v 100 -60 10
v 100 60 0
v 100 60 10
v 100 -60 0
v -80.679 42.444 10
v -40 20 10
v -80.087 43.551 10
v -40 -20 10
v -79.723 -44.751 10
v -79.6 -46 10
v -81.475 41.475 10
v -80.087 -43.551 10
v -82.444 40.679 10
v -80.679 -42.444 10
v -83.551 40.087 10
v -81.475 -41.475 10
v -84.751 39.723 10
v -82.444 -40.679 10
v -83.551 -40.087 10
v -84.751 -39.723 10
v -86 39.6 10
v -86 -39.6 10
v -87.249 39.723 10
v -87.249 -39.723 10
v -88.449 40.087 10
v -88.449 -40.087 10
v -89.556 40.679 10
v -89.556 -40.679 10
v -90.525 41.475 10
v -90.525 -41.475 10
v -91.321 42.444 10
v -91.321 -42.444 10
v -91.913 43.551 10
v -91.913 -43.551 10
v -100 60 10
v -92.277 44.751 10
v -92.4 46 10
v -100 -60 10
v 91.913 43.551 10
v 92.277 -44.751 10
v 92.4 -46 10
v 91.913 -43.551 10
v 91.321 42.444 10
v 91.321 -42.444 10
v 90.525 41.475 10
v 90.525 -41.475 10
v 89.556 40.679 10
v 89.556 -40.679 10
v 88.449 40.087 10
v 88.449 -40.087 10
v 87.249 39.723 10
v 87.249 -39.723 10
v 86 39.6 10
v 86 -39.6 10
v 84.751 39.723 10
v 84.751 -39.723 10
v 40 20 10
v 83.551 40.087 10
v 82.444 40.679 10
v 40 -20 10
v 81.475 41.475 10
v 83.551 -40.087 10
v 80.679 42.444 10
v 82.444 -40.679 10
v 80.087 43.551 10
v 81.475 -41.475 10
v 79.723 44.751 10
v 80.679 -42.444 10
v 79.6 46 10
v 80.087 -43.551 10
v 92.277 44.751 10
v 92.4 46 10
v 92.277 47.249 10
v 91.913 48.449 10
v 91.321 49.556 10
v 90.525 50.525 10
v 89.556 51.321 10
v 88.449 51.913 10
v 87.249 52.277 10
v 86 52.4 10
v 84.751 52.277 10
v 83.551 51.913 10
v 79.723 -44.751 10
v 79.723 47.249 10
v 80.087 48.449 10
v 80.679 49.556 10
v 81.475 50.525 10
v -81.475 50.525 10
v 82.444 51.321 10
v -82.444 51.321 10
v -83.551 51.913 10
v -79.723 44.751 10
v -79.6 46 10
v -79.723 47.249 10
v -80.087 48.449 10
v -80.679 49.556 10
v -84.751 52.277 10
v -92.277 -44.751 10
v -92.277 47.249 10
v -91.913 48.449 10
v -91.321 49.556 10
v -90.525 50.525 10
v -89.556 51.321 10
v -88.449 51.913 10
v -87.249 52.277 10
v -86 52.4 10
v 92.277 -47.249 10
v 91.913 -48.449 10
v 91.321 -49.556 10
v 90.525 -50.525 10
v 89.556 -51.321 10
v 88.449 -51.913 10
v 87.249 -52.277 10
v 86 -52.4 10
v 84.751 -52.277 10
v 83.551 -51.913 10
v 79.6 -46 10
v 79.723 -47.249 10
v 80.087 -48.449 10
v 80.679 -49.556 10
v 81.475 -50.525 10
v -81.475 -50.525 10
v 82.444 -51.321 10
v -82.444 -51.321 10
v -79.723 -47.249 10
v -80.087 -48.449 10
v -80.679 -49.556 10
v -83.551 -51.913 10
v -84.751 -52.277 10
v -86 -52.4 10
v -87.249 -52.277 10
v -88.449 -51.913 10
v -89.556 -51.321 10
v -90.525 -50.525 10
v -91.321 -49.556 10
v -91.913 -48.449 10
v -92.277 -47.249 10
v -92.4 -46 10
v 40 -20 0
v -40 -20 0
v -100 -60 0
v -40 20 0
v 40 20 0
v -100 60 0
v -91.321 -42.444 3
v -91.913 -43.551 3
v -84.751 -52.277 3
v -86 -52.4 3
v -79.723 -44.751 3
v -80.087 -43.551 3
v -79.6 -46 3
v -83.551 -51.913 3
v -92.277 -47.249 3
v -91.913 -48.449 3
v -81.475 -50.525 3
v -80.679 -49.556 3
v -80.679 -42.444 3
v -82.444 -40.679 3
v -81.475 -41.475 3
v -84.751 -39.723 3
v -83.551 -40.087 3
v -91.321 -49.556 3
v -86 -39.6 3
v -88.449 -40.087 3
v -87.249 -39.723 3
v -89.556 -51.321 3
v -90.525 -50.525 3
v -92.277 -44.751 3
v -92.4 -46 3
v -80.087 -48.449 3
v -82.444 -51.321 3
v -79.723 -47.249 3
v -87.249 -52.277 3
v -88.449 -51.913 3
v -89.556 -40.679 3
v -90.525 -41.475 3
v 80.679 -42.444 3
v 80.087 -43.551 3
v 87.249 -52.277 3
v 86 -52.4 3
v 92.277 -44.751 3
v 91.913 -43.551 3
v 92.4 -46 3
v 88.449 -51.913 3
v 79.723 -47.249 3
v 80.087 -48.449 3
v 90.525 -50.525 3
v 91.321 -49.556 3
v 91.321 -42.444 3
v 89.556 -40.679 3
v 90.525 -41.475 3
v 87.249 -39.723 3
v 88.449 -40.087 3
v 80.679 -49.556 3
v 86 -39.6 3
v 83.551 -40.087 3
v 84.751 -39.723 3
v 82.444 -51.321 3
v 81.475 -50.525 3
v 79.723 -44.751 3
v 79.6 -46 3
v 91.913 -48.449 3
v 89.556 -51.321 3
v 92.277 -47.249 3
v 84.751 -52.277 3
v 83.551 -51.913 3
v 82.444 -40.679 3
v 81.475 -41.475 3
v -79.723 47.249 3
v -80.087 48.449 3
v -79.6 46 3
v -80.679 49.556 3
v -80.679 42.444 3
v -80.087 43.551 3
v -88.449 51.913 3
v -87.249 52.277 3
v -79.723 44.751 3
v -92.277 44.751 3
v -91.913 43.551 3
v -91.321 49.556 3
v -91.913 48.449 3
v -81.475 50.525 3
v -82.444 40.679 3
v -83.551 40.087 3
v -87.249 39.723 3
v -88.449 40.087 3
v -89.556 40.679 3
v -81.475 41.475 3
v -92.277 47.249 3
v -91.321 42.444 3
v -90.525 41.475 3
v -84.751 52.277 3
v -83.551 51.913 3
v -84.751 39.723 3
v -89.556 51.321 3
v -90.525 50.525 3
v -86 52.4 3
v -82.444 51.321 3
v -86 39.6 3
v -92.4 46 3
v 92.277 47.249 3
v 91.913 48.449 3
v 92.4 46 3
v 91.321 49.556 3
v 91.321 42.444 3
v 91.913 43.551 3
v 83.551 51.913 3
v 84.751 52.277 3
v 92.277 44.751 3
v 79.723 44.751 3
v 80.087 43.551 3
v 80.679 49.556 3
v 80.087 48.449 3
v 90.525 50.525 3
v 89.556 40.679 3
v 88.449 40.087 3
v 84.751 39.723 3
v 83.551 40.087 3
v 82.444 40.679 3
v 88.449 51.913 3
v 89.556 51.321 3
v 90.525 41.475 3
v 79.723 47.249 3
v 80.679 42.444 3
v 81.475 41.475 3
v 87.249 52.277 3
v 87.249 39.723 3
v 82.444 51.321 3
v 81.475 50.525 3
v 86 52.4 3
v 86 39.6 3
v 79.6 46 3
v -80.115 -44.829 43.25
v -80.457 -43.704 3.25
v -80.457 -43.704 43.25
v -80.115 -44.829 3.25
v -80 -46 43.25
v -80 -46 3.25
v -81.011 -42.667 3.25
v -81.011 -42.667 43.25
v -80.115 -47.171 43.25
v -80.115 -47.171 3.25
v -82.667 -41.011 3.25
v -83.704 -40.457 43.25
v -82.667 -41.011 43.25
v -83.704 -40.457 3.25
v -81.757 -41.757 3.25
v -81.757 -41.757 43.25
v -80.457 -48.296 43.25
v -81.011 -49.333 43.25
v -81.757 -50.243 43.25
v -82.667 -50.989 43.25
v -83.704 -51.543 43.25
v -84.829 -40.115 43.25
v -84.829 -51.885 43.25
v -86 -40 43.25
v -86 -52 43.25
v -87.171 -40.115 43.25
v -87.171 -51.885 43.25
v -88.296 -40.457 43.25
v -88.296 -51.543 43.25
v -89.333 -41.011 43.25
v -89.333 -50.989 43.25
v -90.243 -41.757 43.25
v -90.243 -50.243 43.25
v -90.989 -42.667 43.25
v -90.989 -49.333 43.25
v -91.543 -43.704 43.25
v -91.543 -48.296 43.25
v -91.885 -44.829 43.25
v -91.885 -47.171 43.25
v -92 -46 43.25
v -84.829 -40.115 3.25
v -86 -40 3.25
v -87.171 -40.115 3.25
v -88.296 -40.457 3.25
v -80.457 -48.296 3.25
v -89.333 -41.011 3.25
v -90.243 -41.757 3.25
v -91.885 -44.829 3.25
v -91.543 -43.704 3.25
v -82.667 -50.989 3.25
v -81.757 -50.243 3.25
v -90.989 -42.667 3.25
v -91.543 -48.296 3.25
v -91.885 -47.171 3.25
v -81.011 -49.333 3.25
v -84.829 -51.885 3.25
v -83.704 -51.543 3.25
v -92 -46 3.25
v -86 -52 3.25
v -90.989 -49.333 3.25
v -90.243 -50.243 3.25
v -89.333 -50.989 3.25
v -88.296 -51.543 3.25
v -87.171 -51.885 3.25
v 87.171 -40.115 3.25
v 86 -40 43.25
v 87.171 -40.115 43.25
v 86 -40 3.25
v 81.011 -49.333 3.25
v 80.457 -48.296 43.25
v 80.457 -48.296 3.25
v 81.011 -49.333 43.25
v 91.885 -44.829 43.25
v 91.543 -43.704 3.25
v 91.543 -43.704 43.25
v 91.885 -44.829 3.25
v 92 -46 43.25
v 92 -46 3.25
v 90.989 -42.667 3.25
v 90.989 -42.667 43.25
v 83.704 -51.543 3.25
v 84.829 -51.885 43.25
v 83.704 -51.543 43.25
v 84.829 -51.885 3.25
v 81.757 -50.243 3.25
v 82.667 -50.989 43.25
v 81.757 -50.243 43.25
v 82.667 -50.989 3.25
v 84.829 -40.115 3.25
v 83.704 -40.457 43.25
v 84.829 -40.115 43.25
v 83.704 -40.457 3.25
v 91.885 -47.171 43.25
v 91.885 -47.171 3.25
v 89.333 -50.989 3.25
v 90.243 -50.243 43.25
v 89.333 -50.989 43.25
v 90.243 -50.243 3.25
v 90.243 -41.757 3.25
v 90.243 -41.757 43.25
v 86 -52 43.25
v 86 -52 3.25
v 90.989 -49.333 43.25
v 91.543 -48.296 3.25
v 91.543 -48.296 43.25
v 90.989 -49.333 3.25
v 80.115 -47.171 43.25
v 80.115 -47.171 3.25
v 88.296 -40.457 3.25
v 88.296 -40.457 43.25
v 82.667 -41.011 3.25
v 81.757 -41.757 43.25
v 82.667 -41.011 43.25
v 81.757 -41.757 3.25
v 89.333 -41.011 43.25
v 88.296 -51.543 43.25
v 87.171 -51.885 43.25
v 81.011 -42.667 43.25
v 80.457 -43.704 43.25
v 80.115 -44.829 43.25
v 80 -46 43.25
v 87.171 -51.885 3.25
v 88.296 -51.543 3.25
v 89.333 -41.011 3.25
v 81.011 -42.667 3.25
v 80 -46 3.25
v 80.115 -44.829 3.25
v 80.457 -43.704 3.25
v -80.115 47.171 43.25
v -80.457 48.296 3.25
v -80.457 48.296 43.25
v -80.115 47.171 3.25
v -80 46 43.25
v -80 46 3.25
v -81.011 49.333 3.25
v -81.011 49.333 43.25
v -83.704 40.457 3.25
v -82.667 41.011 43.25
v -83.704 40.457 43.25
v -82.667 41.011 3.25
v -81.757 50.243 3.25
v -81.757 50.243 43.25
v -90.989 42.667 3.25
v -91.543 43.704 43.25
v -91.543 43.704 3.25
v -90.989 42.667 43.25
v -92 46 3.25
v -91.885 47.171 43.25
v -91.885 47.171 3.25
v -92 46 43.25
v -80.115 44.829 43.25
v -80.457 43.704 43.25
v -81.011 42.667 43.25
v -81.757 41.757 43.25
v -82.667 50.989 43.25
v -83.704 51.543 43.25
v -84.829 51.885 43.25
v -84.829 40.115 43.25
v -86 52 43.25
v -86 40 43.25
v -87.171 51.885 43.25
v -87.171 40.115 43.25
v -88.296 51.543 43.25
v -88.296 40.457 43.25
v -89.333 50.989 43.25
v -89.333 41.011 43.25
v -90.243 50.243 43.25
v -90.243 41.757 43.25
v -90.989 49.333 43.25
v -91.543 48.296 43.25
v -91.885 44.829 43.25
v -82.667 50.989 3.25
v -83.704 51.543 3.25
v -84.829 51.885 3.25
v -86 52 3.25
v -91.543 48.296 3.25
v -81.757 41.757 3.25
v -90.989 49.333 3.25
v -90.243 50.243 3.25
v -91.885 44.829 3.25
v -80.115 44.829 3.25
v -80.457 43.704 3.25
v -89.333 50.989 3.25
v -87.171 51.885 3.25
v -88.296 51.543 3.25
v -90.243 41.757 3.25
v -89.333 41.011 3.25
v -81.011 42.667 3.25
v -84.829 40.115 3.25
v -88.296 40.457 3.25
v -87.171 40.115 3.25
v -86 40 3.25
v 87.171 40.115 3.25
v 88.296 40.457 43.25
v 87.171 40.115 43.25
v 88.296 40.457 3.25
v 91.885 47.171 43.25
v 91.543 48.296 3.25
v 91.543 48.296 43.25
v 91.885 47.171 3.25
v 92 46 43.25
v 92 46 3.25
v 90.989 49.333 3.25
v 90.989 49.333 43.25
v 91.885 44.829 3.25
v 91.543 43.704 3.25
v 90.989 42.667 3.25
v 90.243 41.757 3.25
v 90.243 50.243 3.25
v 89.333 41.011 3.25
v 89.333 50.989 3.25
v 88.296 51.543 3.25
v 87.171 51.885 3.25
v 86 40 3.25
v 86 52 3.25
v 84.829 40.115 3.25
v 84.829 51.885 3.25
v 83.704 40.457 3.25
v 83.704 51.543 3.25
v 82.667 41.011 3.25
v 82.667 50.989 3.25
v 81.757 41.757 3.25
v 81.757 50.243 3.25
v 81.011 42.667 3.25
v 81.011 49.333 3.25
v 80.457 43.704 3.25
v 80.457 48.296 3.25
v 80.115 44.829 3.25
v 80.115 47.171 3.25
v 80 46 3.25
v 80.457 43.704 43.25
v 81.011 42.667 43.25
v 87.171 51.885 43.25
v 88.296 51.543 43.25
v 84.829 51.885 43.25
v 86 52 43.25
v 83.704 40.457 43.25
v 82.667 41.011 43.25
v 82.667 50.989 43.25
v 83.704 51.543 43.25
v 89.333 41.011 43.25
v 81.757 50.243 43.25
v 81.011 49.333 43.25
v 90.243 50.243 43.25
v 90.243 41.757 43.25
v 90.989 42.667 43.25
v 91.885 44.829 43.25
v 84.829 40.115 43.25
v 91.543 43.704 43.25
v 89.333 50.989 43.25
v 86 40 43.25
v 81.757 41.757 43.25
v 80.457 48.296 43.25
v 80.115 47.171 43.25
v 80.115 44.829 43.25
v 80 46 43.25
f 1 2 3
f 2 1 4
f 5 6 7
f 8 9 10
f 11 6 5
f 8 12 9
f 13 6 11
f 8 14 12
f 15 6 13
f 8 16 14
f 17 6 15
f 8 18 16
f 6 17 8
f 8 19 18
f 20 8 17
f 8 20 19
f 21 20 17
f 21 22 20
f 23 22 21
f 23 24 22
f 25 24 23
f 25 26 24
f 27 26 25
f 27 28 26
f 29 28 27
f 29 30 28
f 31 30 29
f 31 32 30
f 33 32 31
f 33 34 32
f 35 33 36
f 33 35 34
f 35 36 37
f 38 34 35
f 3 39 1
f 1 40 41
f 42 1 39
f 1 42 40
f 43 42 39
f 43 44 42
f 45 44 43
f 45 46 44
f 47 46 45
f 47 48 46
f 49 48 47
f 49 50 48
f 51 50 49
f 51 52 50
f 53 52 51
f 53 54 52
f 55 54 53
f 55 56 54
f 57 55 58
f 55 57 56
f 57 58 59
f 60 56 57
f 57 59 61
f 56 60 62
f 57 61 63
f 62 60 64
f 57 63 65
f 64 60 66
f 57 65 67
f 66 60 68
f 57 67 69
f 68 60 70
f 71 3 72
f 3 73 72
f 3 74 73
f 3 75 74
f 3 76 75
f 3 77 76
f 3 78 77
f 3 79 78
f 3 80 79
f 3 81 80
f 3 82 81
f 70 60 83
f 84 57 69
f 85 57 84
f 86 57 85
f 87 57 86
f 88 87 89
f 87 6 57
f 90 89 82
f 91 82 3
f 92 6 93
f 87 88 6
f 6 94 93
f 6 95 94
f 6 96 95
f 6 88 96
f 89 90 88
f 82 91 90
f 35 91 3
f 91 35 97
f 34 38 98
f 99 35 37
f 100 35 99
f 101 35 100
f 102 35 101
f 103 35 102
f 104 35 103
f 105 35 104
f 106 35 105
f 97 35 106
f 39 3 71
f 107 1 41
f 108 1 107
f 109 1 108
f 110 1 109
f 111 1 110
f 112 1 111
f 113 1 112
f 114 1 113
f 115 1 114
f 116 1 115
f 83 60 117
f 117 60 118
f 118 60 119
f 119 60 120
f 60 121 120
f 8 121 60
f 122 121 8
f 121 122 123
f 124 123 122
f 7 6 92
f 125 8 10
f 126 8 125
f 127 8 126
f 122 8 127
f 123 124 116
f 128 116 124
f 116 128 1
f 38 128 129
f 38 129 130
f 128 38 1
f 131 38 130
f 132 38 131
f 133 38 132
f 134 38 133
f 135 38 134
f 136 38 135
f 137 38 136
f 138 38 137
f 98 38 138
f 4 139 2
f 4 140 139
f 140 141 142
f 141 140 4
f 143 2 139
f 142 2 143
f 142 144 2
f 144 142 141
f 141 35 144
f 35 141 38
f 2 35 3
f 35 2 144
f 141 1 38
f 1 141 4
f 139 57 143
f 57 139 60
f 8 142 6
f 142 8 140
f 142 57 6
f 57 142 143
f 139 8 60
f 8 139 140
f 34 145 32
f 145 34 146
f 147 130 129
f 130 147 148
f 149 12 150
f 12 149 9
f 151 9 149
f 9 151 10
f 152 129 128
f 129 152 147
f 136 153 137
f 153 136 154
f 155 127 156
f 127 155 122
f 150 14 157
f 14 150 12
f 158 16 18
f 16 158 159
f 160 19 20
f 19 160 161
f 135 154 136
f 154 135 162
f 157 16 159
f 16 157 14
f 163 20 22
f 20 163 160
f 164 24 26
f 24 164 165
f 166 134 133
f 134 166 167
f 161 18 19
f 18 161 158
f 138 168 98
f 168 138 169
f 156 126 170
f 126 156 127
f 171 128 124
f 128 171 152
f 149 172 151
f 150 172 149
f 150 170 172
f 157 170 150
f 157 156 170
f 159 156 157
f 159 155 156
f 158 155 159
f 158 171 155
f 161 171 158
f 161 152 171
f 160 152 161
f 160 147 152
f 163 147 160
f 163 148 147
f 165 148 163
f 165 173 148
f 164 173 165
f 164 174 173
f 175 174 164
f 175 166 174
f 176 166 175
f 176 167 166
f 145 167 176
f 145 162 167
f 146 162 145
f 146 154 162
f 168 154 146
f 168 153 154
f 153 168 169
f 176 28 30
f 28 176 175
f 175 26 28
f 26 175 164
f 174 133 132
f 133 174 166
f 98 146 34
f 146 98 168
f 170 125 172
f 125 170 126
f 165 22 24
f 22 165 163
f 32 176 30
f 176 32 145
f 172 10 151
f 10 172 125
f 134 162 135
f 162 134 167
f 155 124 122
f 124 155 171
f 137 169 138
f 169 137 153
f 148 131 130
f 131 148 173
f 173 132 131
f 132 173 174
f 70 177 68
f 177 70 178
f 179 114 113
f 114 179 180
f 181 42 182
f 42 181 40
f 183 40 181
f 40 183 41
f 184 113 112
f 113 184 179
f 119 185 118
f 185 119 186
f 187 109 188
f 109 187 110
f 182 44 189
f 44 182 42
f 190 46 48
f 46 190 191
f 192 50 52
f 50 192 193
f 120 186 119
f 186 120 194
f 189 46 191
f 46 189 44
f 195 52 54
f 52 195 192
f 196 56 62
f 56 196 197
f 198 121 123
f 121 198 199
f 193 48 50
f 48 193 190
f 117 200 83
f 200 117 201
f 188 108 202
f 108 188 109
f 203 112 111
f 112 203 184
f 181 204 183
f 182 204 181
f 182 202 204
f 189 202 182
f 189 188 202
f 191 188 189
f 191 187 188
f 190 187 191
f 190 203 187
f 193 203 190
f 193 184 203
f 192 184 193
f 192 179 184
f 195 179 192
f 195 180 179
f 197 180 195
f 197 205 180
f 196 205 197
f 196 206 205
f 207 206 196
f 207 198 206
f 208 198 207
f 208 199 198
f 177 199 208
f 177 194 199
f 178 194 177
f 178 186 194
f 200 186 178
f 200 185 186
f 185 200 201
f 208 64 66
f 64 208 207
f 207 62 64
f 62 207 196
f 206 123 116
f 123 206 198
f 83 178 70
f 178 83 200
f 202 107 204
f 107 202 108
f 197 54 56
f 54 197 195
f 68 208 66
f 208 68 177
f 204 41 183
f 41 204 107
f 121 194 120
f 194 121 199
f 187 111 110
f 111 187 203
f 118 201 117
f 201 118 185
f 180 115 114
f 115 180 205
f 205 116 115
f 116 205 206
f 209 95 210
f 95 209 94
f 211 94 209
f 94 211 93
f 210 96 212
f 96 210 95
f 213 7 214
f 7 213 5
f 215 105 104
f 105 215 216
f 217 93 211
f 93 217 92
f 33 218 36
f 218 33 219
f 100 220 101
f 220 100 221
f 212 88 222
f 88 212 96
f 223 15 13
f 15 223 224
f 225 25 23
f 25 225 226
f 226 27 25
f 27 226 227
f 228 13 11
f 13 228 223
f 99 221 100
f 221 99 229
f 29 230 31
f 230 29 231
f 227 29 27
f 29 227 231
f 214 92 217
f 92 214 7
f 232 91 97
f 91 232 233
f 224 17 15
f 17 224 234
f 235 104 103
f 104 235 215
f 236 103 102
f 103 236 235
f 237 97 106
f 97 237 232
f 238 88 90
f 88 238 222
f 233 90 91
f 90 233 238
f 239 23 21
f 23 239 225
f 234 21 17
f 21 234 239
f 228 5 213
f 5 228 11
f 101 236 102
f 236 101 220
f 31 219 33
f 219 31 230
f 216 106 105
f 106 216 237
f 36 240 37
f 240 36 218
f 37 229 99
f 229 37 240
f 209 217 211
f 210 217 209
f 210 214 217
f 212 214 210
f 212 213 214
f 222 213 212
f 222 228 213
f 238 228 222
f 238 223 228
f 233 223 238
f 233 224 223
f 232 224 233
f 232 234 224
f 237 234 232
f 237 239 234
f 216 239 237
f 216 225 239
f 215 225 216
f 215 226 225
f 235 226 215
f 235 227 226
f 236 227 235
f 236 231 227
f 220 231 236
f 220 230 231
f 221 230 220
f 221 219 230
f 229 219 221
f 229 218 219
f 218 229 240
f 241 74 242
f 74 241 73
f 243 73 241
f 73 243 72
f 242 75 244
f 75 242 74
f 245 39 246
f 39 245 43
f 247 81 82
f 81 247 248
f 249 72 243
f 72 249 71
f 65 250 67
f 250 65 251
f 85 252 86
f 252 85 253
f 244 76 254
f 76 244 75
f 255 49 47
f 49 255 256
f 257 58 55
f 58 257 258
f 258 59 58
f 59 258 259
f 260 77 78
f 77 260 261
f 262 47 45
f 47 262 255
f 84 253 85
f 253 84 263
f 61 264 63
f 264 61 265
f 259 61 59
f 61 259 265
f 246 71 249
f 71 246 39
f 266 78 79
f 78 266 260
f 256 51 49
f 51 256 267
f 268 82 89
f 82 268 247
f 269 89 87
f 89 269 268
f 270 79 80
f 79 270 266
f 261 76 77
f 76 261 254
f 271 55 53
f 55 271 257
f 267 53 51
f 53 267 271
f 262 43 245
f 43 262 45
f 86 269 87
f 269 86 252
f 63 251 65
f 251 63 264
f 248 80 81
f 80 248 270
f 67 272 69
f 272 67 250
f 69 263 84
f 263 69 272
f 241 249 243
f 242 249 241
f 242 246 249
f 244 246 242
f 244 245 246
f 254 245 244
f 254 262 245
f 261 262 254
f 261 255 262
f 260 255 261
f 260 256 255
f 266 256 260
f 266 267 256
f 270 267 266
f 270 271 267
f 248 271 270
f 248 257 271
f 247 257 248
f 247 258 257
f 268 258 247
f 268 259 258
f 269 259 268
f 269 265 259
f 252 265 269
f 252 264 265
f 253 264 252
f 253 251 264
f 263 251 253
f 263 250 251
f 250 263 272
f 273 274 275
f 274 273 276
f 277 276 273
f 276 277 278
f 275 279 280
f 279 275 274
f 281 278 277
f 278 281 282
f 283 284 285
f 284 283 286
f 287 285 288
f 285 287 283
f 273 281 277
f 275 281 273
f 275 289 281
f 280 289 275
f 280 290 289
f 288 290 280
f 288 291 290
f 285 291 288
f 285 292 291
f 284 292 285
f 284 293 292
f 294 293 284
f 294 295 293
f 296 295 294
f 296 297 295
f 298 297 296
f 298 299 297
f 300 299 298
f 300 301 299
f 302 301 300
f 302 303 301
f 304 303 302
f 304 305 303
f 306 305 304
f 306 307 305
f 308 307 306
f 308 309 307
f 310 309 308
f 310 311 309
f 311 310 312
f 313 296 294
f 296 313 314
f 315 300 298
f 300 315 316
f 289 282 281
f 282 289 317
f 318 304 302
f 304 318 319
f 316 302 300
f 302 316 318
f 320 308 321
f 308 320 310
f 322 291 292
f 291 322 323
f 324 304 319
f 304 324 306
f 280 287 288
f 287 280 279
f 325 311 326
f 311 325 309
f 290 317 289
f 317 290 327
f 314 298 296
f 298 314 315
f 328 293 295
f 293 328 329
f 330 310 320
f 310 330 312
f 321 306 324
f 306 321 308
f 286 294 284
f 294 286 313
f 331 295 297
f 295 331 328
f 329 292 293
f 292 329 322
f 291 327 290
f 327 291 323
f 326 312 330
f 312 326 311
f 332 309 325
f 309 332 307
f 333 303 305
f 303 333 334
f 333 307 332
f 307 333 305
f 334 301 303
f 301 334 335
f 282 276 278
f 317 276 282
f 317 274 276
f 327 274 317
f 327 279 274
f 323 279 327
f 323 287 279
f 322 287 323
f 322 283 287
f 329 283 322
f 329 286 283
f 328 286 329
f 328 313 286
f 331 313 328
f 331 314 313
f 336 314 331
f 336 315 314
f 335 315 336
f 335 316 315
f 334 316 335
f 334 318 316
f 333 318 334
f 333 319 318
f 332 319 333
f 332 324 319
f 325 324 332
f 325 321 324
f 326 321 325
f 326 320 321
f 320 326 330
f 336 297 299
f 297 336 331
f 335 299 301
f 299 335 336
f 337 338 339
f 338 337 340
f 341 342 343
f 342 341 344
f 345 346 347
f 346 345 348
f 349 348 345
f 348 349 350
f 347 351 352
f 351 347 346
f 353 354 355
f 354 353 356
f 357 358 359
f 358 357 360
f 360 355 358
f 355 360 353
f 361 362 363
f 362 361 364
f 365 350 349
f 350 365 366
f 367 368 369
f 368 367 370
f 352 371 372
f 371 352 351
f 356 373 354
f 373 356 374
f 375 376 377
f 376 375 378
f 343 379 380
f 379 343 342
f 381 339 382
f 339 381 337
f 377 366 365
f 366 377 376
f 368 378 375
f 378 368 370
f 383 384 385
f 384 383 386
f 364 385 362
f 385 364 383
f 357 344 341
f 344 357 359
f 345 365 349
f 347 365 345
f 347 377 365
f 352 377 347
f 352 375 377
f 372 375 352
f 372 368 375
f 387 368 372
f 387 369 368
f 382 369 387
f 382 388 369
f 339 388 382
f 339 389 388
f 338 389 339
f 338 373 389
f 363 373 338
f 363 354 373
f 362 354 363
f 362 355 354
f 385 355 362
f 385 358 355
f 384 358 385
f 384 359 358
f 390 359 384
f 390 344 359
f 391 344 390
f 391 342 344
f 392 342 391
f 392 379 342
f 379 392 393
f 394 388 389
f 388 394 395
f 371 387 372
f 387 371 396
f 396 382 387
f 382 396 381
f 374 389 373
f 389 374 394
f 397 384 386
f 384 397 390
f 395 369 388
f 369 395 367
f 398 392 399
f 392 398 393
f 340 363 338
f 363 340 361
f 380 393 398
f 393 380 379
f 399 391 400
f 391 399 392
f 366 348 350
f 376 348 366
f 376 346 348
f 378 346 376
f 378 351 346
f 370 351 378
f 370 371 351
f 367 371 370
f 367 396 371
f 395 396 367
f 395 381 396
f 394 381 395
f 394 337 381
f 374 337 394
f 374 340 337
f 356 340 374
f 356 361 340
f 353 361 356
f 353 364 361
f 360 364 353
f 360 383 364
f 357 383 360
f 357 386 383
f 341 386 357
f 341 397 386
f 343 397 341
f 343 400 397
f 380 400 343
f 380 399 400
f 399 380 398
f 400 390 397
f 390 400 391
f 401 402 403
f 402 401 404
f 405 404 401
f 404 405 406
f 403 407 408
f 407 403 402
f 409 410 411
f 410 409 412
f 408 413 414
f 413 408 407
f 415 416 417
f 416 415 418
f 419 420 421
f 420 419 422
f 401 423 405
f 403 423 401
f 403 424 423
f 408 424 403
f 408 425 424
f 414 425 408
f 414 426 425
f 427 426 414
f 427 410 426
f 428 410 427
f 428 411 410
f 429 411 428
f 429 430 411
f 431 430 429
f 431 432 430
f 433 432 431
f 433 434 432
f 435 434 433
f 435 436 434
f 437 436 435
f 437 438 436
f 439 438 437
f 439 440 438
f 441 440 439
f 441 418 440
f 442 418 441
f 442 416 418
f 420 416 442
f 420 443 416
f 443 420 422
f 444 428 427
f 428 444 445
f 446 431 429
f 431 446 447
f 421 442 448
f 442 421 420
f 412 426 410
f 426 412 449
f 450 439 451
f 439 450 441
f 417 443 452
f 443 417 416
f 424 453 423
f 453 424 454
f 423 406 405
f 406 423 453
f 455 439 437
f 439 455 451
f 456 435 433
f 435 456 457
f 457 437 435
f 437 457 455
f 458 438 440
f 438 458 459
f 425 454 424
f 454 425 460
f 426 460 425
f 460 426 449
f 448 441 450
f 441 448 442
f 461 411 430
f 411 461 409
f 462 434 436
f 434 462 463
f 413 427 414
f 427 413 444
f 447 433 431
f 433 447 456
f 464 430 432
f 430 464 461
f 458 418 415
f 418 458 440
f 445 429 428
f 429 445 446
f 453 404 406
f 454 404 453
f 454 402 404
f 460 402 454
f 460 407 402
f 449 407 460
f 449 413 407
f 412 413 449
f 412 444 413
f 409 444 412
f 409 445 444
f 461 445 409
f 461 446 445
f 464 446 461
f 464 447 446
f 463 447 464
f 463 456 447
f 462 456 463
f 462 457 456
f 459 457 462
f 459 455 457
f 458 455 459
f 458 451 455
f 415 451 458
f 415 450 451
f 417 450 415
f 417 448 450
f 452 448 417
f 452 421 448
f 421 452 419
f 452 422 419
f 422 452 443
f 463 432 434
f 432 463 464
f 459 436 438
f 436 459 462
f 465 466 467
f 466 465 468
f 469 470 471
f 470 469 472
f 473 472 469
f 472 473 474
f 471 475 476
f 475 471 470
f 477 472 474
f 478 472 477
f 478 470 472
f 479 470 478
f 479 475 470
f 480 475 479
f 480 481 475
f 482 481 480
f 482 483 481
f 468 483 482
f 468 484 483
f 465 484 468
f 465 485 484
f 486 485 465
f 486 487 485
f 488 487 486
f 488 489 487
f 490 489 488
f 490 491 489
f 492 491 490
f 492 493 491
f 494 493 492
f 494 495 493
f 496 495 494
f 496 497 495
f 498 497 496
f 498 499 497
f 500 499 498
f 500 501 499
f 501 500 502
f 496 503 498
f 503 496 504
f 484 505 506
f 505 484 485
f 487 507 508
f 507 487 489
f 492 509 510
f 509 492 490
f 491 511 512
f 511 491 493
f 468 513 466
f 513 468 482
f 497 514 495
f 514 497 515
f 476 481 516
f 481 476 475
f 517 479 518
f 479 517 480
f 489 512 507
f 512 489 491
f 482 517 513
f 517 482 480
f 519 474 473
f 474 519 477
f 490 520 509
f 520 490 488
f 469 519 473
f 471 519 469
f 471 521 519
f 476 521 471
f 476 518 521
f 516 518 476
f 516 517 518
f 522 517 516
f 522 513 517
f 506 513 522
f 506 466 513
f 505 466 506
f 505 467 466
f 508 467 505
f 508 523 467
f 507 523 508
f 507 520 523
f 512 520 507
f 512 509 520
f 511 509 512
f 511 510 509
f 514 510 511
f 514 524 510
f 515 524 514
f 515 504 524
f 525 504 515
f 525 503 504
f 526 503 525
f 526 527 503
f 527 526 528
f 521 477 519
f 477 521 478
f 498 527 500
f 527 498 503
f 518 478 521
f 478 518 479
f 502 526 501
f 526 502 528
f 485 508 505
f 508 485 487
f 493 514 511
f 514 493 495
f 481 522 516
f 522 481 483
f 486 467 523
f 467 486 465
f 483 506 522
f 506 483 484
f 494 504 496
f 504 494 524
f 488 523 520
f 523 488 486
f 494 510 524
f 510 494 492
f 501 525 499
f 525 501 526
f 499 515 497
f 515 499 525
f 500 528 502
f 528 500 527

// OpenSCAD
$fn = 32;

// ------------------------------------------------------------------------
// Frame with four posts: 200 x 120 mm frame, four d12 posts
// Every part is its own module, assembly() places them once.
// ------------------------------------------------------------------------

// --- part 1 ---
module base_frame() {
  difference() {
    translate([-100, -60, 0]) cube([200, 120, 10]);
    translate([-40, -20, -1]) cube([80, 40, 12]);
    translate([-86, -46, 3]) cylinder(h = 8, d = 12.8);
    translate([86, -46, 3]) cylinder(h = 8, d = 12.8);
    translate([-86, 46, 3]) cylinder(h = 8, d = 12.8);
    translate([86, 46, 3]) cylinder(h = 8, d = 12.8);
  }
}

// --- part 2 ---
module post1() {
  cylinder(h = 40, d = 12);
}

// --- part 3 ---
module post2() {
  cylinder(h = 40, d = 12);
}

// --- part 4 ---
module post3() {
  cylinder(h = 40, d = 12);
}

// --- part 5 ---
module post4() {
  cylinder(h = 40, d = 12);
}

// --- assembly ---
module assembly() {
  translate([0, 0, 0]) rotate([0, 0, 0]) base_frame();
  translate([-86, -46, 3.25]) rotate([0, 0, 0]) post1();
  translate([86, -46, 3.25]) rotate([0, 0, 0]) post2();
  translate([-86, 46, 3.25]) rotate([0, 0, 0]) post3();
  translate([86, 46, 3.25]) rotate([0, 0, 0]) post4();
}

assembly();
